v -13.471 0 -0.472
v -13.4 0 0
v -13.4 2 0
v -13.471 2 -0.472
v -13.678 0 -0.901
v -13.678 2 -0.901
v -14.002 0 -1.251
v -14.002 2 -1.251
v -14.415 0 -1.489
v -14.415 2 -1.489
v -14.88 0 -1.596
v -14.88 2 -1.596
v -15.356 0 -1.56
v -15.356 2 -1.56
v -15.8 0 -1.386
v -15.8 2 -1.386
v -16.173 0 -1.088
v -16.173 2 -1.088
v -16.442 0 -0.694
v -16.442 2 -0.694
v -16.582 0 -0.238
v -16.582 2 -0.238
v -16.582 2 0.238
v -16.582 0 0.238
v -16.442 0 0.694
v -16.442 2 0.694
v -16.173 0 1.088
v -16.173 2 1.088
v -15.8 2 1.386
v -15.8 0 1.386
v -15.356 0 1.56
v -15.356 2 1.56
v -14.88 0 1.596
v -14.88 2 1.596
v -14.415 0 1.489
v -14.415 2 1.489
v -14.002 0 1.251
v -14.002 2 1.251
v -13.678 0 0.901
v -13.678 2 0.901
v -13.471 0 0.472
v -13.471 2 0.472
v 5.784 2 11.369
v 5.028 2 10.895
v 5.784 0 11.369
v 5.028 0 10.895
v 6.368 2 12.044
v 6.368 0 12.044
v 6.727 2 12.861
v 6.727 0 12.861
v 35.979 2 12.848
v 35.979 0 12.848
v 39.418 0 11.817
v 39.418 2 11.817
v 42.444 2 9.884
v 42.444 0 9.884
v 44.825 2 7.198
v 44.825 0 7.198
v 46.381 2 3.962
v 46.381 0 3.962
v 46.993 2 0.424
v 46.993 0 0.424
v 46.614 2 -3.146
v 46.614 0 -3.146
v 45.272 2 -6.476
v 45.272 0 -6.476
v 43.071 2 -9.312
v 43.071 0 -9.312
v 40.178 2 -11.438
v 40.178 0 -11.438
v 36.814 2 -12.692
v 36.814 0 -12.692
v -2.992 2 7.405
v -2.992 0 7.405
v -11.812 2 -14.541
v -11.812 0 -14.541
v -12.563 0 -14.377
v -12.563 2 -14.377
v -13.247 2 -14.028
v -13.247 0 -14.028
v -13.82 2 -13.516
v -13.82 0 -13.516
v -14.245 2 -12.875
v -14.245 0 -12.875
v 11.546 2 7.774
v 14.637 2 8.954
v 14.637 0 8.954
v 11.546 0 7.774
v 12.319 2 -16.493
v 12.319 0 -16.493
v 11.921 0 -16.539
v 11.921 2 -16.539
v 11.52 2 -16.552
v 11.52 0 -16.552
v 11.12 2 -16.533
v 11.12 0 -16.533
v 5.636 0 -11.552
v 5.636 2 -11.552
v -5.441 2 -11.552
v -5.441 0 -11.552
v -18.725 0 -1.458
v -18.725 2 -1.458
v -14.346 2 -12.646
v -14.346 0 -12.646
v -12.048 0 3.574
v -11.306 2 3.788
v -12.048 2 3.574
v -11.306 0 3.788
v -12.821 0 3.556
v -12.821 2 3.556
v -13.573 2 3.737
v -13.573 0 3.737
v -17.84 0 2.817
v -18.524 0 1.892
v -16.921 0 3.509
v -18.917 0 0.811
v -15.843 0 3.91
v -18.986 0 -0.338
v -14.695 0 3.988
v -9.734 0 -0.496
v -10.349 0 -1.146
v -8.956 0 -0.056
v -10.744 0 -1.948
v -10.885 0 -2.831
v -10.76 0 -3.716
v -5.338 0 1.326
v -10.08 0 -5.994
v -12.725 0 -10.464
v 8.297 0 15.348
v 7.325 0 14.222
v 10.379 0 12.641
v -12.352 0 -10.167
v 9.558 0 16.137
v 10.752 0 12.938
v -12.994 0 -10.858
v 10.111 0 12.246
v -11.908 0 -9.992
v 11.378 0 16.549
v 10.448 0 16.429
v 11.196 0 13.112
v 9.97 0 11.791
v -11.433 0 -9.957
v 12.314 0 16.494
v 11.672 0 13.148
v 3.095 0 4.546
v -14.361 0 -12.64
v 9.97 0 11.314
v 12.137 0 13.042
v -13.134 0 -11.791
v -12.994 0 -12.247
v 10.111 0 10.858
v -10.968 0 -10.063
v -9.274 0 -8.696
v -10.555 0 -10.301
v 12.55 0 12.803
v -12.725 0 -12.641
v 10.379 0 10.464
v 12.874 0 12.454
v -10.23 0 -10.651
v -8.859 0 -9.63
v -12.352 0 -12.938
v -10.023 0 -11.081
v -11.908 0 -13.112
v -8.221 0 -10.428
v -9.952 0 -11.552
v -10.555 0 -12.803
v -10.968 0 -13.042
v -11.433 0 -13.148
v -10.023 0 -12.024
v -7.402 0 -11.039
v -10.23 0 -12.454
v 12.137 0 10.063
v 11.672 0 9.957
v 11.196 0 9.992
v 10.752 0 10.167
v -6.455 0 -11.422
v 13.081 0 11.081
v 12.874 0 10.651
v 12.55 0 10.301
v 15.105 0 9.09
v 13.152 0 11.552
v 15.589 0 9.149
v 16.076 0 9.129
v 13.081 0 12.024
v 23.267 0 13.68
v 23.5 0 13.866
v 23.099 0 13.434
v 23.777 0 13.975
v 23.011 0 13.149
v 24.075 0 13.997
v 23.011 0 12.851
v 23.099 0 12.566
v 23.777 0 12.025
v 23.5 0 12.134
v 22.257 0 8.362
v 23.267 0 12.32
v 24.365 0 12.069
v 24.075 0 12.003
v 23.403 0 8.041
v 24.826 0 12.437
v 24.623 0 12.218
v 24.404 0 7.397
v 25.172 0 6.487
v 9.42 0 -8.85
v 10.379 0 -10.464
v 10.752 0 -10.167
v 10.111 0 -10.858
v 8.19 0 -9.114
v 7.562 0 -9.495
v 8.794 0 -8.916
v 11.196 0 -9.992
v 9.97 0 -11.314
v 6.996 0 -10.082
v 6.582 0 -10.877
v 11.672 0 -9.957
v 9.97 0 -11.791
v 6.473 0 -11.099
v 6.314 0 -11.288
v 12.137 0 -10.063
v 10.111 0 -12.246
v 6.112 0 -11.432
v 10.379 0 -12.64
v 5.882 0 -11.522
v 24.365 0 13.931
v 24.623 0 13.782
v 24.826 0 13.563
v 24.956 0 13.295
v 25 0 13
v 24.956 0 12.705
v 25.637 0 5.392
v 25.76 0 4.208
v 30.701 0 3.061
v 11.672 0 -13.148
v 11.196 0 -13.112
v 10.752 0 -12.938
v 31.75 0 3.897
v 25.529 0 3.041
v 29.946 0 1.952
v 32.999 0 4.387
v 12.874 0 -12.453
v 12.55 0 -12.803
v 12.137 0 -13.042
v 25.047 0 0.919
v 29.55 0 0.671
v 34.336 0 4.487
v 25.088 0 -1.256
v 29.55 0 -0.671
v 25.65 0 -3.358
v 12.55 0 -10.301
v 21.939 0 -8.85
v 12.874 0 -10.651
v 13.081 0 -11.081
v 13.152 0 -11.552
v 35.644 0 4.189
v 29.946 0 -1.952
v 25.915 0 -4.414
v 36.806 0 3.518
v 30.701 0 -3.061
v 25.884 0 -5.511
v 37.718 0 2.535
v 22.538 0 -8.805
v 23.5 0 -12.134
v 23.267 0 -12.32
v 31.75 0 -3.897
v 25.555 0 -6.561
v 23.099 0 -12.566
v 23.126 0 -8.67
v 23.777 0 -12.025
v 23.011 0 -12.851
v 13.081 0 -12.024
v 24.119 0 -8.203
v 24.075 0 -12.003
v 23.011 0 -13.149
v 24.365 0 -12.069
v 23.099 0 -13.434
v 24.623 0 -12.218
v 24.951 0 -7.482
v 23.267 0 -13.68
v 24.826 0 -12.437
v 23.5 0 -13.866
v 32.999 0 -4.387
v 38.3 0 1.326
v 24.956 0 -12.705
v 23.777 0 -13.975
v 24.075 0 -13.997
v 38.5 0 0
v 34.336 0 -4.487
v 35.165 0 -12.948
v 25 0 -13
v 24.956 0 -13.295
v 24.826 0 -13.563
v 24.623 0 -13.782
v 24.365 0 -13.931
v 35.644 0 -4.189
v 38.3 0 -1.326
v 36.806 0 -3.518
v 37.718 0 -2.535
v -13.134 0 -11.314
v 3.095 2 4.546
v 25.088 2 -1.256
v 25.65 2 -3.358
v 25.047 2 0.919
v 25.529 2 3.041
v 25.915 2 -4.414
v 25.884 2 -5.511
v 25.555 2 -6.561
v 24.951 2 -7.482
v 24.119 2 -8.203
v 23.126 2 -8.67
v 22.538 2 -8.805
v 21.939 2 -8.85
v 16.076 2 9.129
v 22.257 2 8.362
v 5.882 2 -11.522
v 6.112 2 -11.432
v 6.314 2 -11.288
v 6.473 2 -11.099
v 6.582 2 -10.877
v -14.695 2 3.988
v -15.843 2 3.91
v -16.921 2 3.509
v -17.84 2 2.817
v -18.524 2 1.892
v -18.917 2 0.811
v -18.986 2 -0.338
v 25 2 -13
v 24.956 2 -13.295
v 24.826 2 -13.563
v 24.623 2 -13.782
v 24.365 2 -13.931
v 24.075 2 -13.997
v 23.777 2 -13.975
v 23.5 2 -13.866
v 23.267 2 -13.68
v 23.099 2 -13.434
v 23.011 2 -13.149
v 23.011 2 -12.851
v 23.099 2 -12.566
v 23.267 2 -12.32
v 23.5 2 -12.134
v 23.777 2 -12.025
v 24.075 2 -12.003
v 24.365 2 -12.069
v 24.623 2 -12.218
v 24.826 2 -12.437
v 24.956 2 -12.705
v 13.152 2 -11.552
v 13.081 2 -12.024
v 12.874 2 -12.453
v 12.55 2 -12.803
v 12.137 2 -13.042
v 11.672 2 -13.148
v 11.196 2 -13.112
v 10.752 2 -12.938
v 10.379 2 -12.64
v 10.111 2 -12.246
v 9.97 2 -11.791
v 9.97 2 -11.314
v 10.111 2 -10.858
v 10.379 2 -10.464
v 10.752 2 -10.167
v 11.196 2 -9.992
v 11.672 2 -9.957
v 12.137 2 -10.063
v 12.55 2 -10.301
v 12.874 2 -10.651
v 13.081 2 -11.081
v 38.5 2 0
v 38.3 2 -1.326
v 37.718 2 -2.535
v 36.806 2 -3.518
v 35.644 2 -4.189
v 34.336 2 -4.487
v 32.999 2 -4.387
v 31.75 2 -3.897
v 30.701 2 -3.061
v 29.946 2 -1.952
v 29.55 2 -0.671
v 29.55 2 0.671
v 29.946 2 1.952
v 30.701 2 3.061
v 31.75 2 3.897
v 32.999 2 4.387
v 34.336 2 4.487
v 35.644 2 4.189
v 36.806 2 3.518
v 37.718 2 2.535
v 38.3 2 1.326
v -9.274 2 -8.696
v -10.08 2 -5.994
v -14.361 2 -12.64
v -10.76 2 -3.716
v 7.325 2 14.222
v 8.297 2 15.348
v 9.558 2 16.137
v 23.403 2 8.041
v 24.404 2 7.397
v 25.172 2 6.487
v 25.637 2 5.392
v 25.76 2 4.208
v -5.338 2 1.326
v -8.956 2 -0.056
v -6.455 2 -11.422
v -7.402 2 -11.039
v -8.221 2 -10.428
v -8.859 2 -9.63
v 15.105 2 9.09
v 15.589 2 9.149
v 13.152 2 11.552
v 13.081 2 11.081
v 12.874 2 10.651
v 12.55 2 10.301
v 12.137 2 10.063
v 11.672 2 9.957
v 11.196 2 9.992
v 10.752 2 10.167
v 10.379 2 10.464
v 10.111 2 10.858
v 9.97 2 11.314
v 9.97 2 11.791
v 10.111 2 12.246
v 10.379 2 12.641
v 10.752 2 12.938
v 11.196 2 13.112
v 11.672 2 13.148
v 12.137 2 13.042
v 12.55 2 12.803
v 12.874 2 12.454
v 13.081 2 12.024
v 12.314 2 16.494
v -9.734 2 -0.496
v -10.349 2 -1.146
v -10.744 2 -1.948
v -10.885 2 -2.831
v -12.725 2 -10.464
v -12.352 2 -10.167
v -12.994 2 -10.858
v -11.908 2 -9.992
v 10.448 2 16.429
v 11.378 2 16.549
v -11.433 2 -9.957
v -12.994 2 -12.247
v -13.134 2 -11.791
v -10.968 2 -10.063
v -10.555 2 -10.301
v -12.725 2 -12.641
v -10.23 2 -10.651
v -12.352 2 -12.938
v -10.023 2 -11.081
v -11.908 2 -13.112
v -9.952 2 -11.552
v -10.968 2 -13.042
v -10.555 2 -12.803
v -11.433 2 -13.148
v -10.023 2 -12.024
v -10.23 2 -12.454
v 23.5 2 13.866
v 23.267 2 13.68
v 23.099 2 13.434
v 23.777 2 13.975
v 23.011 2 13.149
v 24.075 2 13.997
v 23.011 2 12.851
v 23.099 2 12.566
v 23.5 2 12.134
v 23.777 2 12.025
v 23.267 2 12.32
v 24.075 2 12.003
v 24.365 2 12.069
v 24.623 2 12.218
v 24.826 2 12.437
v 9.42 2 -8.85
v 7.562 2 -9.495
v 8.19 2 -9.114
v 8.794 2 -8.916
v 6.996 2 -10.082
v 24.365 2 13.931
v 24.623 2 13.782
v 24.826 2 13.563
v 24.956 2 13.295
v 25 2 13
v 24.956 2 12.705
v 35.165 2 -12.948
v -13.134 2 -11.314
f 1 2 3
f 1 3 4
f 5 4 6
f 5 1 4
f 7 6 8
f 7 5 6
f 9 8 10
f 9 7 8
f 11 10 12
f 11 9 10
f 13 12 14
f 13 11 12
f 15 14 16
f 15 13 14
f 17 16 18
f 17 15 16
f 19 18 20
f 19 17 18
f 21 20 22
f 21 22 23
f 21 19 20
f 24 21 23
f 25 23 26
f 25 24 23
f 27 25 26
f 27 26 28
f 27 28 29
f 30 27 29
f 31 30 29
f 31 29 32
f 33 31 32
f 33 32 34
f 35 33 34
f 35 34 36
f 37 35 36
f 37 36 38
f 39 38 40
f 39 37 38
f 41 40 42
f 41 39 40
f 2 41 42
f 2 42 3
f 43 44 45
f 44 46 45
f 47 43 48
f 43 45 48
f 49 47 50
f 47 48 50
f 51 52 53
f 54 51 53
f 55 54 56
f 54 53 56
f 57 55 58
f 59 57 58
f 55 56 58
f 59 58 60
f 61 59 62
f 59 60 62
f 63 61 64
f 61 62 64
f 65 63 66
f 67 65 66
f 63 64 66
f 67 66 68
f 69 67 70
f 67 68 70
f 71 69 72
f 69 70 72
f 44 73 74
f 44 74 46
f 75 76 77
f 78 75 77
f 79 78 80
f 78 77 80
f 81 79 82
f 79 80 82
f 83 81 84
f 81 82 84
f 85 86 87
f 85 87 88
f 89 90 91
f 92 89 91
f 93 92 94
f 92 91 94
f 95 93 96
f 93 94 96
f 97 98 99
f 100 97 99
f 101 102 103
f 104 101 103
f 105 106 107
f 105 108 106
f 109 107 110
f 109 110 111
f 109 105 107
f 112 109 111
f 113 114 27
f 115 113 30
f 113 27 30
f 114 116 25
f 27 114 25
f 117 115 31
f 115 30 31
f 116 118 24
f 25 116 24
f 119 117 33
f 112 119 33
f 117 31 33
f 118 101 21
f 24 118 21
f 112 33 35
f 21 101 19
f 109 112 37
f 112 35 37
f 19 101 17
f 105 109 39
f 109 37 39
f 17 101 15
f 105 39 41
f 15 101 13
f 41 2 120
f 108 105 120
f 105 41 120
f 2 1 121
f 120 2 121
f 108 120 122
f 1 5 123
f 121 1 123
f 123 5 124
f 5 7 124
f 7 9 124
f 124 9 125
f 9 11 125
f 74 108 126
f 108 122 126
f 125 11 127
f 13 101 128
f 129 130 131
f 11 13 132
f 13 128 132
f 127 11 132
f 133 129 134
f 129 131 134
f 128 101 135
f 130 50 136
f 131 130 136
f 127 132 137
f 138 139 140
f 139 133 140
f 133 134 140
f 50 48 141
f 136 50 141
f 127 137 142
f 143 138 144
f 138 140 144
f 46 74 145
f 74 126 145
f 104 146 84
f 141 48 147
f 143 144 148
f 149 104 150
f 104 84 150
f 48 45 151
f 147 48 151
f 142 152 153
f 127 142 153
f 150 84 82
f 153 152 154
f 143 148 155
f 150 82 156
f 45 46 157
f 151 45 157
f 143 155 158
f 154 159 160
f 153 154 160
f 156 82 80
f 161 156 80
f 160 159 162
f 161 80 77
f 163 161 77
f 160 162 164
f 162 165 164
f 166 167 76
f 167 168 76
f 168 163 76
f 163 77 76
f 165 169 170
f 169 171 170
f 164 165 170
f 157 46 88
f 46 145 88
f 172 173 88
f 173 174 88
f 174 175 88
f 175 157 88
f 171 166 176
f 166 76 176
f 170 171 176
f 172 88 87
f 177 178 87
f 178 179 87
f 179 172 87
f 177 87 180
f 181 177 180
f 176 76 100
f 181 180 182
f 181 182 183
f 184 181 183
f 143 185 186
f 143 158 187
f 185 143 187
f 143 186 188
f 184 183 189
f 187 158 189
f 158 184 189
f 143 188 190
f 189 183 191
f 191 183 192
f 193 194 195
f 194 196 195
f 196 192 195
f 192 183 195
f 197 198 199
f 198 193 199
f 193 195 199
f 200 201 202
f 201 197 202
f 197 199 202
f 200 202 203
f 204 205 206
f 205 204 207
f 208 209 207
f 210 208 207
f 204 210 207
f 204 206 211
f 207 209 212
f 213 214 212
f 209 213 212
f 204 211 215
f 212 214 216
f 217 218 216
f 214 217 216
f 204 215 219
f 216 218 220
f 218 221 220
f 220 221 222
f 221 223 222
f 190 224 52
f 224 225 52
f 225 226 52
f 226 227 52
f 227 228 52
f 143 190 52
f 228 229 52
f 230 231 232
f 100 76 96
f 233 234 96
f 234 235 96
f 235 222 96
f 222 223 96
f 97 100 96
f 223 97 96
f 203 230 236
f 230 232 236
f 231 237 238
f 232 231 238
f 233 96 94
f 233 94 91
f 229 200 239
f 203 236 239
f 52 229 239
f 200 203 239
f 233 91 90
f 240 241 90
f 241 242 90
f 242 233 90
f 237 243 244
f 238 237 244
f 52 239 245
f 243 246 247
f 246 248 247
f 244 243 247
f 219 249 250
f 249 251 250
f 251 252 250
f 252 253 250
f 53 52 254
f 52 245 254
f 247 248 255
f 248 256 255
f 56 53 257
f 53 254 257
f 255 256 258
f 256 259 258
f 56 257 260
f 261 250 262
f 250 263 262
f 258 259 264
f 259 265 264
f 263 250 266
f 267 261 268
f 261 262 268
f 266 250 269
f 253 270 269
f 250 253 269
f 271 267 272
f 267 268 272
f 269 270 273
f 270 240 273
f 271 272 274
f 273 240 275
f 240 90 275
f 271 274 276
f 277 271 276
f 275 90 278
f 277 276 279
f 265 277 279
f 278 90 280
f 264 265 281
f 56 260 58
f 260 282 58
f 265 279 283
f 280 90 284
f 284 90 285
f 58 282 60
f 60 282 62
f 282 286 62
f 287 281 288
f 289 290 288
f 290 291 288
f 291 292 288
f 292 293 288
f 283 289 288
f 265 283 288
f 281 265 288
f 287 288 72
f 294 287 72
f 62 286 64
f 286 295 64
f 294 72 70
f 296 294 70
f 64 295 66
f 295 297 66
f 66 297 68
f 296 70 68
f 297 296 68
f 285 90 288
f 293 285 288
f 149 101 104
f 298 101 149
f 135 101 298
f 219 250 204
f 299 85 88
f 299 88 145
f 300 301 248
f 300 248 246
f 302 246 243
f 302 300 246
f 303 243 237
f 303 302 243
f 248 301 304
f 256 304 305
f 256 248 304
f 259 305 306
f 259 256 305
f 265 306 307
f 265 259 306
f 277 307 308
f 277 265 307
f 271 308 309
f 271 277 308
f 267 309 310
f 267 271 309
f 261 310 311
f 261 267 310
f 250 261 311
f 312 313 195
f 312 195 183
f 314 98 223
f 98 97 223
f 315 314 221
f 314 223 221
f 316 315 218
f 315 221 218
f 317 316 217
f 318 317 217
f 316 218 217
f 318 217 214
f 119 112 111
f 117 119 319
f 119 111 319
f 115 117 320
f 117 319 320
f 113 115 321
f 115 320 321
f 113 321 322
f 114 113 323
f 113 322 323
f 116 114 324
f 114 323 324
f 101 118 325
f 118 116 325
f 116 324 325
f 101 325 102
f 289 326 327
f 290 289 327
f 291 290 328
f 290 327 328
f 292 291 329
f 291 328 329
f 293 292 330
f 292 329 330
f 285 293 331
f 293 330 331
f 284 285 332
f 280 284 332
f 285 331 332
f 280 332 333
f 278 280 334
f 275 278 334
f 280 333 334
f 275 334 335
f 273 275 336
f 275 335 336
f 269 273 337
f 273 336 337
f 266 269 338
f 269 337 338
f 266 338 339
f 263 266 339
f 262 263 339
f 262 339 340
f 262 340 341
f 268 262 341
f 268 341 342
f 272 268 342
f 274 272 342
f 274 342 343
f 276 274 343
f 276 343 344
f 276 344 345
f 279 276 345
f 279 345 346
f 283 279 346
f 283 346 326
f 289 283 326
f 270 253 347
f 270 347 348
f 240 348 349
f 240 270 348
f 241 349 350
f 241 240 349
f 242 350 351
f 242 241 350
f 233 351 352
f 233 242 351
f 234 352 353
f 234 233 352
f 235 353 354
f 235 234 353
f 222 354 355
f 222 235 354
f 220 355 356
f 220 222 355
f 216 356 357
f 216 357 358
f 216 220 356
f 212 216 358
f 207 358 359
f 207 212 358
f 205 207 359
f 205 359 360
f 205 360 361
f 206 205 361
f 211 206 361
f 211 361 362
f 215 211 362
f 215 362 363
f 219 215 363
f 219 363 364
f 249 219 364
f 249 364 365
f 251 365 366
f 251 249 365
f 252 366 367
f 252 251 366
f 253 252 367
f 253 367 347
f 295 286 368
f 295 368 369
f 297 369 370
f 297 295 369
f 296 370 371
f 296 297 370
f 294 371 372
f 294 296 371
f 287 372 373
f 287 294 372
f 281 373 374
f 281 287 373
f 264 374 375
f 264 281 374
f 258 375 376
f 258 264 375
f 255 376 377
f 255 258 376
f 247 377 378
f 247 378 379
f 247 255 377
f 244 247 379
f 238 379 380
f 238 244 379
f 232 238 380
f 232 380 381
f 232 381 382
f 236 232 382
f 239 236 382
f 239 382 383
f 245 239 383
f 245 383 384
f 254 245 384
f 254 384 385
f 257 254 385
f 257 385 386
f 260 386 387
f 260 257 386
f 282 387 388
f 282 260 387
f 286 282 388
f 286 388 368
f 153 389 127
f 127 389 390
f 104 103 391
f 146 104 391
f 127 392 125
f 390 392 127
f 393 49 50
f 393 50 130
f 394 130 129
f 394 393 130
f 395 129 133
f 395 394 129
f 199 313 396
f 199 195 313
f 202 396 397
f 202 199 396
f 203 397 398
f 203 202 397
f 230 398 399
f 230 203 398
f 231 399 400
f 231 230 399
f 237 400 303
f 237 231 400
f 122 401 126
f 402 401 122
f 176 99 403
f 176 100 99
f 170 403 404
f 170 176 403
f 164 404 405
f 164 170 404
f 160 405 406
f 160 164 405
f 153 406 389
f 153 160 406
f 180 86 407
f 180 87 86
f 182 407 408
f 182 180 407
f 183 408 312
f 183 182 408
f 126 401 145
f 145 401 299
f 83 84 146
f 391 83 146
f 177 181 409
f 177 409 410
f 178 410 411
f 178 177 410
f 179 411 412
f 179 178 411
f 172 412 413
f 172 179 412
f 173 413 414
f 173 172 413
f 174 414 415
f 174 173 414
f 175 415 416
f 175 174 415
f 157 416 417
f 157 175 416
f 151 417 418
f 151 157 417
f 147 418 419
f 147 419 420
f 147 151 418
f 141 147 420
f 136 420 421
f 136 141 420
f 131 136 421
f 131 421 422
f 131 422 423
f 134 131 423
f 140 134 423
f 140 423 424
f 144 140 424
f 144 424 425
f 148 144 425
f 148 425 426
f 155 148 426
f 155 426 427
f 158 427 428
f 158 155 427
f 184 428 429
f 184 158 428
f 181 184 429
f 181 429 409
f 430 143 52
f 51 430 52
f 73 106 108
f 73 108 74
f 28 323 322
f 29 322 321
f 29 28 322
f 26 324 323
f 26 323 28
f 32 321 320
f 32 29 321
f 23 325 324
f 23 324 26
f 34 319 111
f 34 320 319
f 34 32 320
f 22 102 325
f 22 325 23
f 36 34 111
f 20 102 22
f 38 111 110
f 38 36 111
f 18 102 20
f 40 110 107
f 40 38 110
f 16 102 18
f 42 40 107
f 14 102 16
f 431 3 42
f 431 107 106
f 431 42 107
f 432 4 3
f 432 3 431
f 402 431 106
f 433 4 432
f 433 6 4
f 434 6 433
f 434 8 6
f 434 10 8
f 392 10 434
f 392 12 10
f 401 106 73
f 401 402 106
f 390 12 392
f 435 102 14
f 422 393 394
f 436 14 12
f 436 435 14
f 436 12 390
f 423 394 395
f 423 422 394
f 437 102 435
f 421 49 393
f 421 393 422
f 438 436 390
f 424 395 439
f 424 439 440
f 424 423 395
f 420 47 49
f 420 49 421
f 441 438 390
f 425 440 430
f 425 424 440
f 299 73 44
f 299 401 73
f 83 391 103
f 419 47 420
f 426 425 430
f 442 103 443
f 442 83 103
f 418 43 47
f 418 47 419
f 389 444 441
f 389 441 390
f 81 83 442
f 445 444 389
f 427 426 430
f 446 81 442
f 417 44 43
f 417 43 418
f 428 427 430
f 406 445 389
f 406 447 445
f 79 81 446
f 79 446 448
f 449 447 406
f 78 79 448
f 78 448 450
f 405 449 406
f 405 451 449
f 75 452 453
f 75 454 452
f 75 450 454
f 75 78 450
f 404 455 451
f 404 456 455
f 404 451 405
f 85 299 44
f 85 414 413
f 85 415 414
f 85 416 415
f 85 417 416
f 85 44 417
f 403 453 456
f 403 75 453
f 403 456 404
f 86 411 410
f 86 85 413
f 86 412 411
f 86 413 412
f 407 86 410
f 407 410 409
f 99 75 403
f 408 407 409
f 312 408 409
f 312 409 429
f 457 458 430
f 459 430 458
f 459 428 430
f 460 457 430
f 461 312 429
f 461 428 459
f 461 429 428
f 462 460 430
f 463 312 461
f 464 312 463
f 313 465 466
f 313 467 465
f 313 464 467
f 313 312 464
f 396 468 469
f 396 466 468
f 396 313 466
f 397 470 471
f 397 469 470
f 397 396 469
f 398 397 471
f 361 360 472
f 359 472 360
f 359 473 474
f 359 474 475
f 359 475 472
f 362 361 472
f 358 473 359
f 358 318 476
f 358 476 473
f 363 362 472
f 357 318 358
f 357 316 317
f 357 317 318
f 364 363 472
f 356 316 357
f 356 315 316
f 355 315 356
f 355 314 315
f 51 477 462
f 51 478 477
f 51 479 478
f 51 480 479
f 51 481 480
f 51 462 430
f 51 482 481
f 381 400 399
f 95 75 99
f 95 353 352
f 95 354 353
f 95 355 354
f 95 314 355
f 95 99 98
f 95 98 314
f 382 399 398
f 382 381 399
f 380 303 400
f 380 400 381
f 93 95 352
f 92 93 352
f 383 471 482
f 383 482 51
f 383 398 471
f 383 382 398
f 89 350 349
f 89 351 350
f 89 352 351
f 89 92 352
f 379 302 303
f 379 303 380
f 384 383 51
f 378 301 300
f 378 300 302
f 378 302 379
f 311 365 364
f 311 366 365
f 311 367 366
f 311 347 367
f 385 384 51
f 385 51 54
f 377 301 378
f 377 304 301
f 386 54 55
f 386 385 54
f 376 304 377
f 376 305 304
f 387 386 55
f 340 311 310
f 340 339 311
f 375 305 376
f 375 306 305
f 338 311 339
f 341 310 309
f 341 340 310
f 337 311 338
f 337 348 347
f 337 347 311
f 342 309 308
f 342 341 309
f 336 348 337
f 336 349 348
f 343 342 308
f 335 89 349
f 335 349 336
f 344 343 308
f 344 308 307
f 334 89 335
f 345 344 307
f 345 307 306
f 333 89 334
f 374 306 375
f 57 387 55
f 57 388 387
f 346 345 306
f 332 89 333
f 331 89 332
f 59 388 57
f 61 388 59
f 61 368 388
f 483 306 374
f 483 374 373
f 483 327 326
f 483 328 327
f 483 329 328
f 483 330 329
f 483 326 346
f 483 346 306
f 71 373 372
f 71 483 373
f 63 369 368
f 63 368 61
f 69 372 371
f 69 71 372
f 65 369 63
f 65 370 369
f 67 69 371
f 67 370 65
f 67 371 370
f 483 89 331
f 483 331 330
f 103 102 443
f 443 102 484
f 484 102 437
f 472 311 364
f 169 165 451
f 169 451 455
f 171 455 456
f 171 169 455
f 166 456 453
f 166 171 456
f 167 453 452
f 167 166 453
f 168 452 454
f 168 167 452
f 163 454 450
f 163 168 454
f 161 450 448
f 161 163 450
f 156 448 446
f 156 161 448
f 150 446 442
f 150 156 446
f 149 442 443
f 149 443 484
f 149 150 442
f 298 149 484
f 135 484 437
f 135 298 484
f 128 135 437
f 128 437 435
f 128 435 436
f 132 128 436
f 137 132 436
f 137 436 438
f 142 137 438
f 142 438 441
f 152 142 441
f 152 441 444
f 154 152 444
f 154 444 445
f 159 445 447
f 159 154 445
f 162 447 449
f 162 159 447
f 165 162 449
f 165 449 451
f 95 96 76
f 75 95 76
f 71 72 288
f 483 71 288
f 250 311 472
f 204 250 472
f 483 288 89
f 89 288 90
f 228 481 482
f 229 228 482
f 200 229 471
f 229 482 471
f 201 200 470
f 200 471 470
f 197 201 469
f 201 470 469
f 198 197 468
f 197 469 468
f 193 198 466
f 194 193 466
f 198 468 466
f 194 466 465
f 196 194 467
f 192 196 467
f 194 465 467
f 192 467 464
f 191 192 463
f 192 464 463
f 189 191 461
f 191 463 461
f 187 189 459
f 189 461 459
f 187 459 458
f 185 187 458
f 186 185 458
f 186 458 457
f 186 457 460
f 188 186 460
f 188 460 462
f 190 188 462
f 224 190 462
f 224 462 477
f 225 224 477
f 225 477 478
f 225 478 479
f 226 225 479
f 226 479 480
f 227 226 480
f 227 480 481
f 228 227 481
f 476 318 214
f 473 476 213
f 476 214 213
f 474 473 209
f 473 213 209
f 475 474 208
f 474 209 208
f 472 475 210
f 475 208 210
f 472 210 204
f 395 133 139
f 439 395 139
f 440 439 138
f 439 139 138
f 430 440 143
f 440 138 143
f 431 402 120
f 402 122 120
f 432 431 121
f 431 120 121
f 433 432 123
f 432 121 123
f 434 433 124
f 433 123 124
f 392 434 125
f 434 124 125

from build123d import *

# Parameters (mm, degrees)
SKETCH1_R           = 1.6
SKETCH1_R_2         = 1
SKETCH1_R_3         = 5.5
SKETCH1_R_4         = 4.5
BOSS_EXTRUDE2_DEPTH = 2
SKETCH2_R           = 1
BOSS_EXTRUDE3_DEPTH = 2
SKETCH3_R           = 1
CUT_EXTRUDE1_DEPTH  = 103
CUT_EXTRUDE2_DEPTH  = 10
BOSS_EXTRUDE4_DEPTH = 2
FILLET1_R           = 3
CUT_EXTRUDE3_DEPTH  = 10
CUT_EXTRUDE4_DEPTH  = 10
BOSS_EXTRUDE5_DEPTH = 2
CUT_EXTRUDE5_DEPTH  = 10
CUT_EXTRUDE9_DEPTH  = 10
FILLET3_R           = 4
CUT_EXTRUDE10_DEPTH = 10
FILLET4_R           = 4
FILLET6_R           = 1
FILLET7_R           = 3
SKETCH13_R          = 1.6
SKETCH13_R_2        = 1
SKETCH13_R_3        = 4.5
BOSS_EXTRUDE7_DEPTH = 2
FILLET8_R           = 3


with BuildPart() as part:
    # Sketch1 → Boss-Extrude2 (new body)
    with BuildSketch(Plane(origin=(0, 0, 0), x_dir=(1, 0, 0), z_dir=(0, 1, 0))):
        with BuildLine():
            Line((12.313589515, -16.493996637), (35.979225245, -12.848450001))
            ThreePointArc((35.979225245, -12.848450001), (46.993067566, -0.424494085), (36.813648041, 12.691862933))
            Line((36.813648041, 12.691862933), (35.165189196, 12.947676785))
            Line((35.165189196, 12.947676785), (12.319067304, 16.493021261))
            ThreePointArc((12.319067304, 16.493021261), (11.720527595, 16.549330191), (11.119556233, 16.533395936))
            Line((11.119556233, 16.533395936), (-11.812019178, 14.541098507))
            ThreePointArc((-11.812019178, 14.541098507), (-13.247239988, 14.027709898), (-14.244912332, 12.87528787))
            Line((-14.244912332, 12.87528787), (-19.487592157, 2.204884721))
            ThreePointArc((-19.487592157, 2.204884721), (-19.693653105, -1.723258696), (-16.994761113, -4.584858569))
            Line((-16.994761113, -4.584858569), (9.557587922, -16.137143667))
            ThreePointArc((9.557587922, -16.137143667), (10.910298182, -16.51089082), (12.313589515, -16.493996637))
        make_face()
        with Locations((11.552349036, -11.552285098)):
            Circle(SKETCH1_R, mode=Mode.SUBTRACT)
        with Locations((25, -11)):
            Circle(SKETCH1_R_2, mode=Mode.SUBTRACT)
        with Locations((-15, 0)):
            Circle(SKETCH1_R, mode=Mode.SUBTRACT)
        Circle(SKETCH1_R_3, mode=Mode.SUBTRACT)
        with Locations((-11.552357038, 11.552357038)):
            Circle(SKETCH1_R, mode=Mode.SUBTRACT)
        with Locations((11.552326466, 11.552160153)):
            Circle(SKETCH1_R, mode=Mode.SUBTRACT)
        with Locations((14, 0)):
            Circle(SKETCH1_R_4, mode=Mode.SUBTRACT)
        with Locations((34, 0)):
            Circle(SKETCH1_R_4, mode=Mode.SUBTRACT)
        with Locations((25, 11)):
            Circle(SKETCH1_R_2, mode=Mode.SUBTRACT)
    extrude(amount=BOSS_EXTRUDE2_DEPTH)

    # Sketch2 → Boss-Extrude3 (add)
    with BuildSketch(Plane(origin=(0, 2, 0), x_dir=(1, 0, 0), z_dir=(0, 1, 0))):
        with Locations((25, 11)):
            Circle(SKETCH2_R)
        with Locations((25, -11)):
            Circle(SKETCH2_R)
    extrude(amount=-BOSS_EXTRUDE3_DEPTH)

    # Sketch3 → Cut-Extrude1 (cut)
    with BuildSketch(Plane(origin=(0, 2, 0), x_dir=(1, 0, 0), z_dir=(0, 1, 0))):
        with Locations((24, 13)):
            Circle(SKETCH3_R)
        with Locations((24, -13)):
            Circle(SKETCH3_R)
    extrude(amount=-CUT_EXTRUDE1_DEPTH, mode=Mode.SUBTRACT)

    # Sketch4 → Cut-Extrude2 (cut)
    with BuildSketch(Plane(origin=(0, 2, 0), x_dir=(1, 0, 0), z_dir=(0, 1, 0))):
        with BuildLine():
            Line((-11.556207856, 1.04895048), (-9.269369924, 8.711683705))
            Line((-9.269369924, 8.711683705), (11.51784634, 8.478494442))
            Line((11.51784634, 8.478494442), (14.72101257, 8.44256159))
            ThreePointArc((14.72101257, 8.44256159), (23.806986873, -0.105659112), (15.258766171, -9.191633415))
            Line((15.258766171, -9.191633415), (11.546390573, -7.773884745))
            Line((11.546390573, -7.773884745), (-11.556207856, 1.04895048))
        make_face()
    extrude(amount=-CUT_EXTRUDE2_DEPTH, mode=Mode.SUBTRACT)

    # Sketch5 → Boss-Extrude4 (add)
    with BuildSketch(Plane(origin=(0, 2, 0), x_dir=(1, 0, 0), z_dir=(0, 1, 0))):
        Polygon((-5.337802217, -1.325845952), (3.09520559, -4.546394435), (3.755970184, -8.105851045), (-7.77052306, -5.643881614), align=None)
    extrude(amount=-BOSS_EXTRUDE4_DEPTH)

    # Fillet1
    fillet1_edges = [part.edges().sort_by_distance(p)[0] for p in [
        (14.72101257, 1, -8.44256159),
        (-11.556207856, 1, -1.04895048),
        (-9.269369924, 1, -8.711683705),
        (15.258766171, 1, 9.191633415),
    ]]
    fillet(fillet1_edges, radius=FILLET1_R)

    # Sketch6 → Cut-Extrude3 (cut)
    with BuildSketch(Plane(origin=(0, 2, 0), x_dir=(1, 0, 0), z_dir=(0, 1, 0))):
        with BuildLine():
            Line((-10.415141431, -1.994761113), (6.967490467, -9.557523985))
            ThreePointArc((6.967490467, -9.557523985), (7.370614613, -14.293288056), (11.552349036, -16.552285098))
            Line((11.552349036, -16.552285098), (4.640159697, -19.625925194))
            Line((4.640159697, -19.625925194), (-19.442024068, -14.318556871))
            Line((-19.442024068, -14.318556871), (-16.994761113, -4.584858569))
            ThreePointArc((-16.994761113, -4.584858569), (-13.168524525, -4.652493695), (-10.415141431, -1.994761113))
        make_face()
    extrude(amount=-CUT_EXTRUDE3_DEPTH, mode=Mode.SUBTRACT)

    # Sketch7 → Cut-Extrude4 (cut)
    with BuildSketch(Plane(origin=(0, 2, 0), x_dir=(1, 0, 0), z_dir=(0, 1, 0))):
        with BuildLine():
            Line((-19.487592157, 2.204884721), (-14.360758579, 12.639506513))
            Line((-14.360758579, 12.639506513), (-40.027877899, 1.746555748))
            Line((-40.027877899, 1.746555748), (-13.686394089, -14.892557088))
            Line((-13.686394089, -14.892557088), (-5.537805094, -4.116772232))
            Line((-5.537805094, -4.116772232), (-10.415141431, -1.994761113))
            ThreePointArc((-10.415141431, -1.994761113), (-17.100386029, -4.537441849), (-19.487592157, 2.204884721))
        make_face()
        with BuildLine():
            Line((-18.724859342, 1.457883014), (-14.346001544, 12.645769298))
            Line((-14.346001544, 12.645769298), (-14.360758579, 12.639506513))
            Line((-14.360758579, 12.639506513), (-19.487592157, 2.204884721))
            ThreePointArc((-19.487592157, 2.204884721), (-17.100386029, -4.537441849), (-10.415141431, -1.994761113))
            Line((-10.415141431, -1.994761113), (-11.332113145, -1.595808891))
            ThreePointArc((-11.332113145, -1.595808891), (-16.527111662, -3.697016361), (-18.724859342, 1.457883014))
        make_face()
    extrude(amount=-CUT_EXTRUDE4_DEPTH, mode=Mode.SUBTRACT)

    # Sketch8 → Boss-Extrude5 (add)
    with BuildSketch(Plane(origin=(0, 2, 0), x_dir=(1, 0, 0), z_dir=(0, 1, 0))):
        Polygon((-2.581263562, -6.493638152), (8.323551355, -11.238059471), (9.15275877, -8.13729454), (-12.005428352, 0), (-12.793973249, -2.050335084), align=None)
    extrude(amount=-BOSS_EXTRUDE5_DEPTH)

    # Sketch9 → Cut-Extrude5 (cut)
    with BuildSketch(Plane(origin=(0, 2, 0), x_dir=(1, 0, 0), z_dir=(0, 1, 0))):
        with BuildLine():
            Line((3.827614939, 8.564762818), (30.440563146, 8.266220979))
            ThreePointArc((30.440563146, 8.266220979), (25.034594613, 0.788356673), (29.052589856, -7.518186807))
            Line((29.052589856, -7.518186807), (16.076287148, -9.128577435))
            Line((16.076287148, -9.128577435), (3.827614939, 8.564762818))
        make_face()
    extrude(amount=-CUT_EXTRUDE5_DEPTH, mode=Mode.SUBTRACT)

    # Sketch10 → Cut-Extrude9 (cut)
    with BuildSketch(Plane(origin=(0, 2, 0), x_dir=(1, 0, 0), z_dir=(0, 1, 0))):
        with BuildLine():
            ThreePointArc((-7.00779509, 8.686313546), (-8.820444577, 8.102111249), (-9.916159809, 6.544421096))
            Line((-9.916159809, 6.544421096), (25.022400978, -0.634598928))
            ThreePointArc((25.022400978, -0.634598928), (26.312317261, 4.679693805), (30.440563146, 8.266220979))
            Line((30.440563146, 8.266220979), (22.948527848, 8.350266008))
            Line((22.948527848, 8.350266008), (15.45649255, 8.434311037))
            ThreePointArc((15.45649255, 8.434311037), (15.11388418, 8.44578882), (14.771088556, 8.443946344))
            ThreePointArc((14.771088556, 8.443946344), (14.717060069, 8.443092594), (14.663024969, 8.44321209))
            Line((14.663024969, 8.44321209), (-7.00779509, 8.686313546))
        make_face()
        with BuildLine():
            Line((-9.442365056, 8.850266008), (-9.916159809, 6.544421096))
            ThreePointArc((-9.916159809, 6.544421096), (-8.820444577, 8.102111249), (-7.00779509, 8.686313546))
            Line((-7.00779509, 8.686313546), (14.663024969, 8.44321209))
            ThreePointArc((14.663024969, 8.44321209), (14.717060069, 8.443092594), (14.771088556, 8.443946344))
            ThreePointArc((14.771088556, 8.443946344), (15.11388418, 8.44578882), (15.45649255, 8.434311037))
            Line((15.45649255, 8.434311037), (22.948527848, 8.350266008))
            Line((22.948527848, 8.350266008), (22.948527848, 8.850266008))
            Line((22.948527848, 8.850266008), (-9.442365056, 8.850266008))
        make_face()
        with BuildLine():
            Line((22.948527848, 8.350266008), (30.440563146, 8.266220979))
            ThreePointArc((30.440563146, 8.266220979), (31.386481977, 8.612172986), (32.365132548, 8.850266008))
            Line((32.365132548, 8.850266008), (22.948527848, 8.850266008))
            Line((22.948527848, 8.850266008), (22.948527848, 8.350266008))
        make_face()
    extrude(amount=-CUT_EXTRUDE9_DEPTH, mode=Mode.SUBTRACT)

    # Fillet3
    fillet3_edges = [part.edges().sort_by_distance(p)[0] for p in [
        (-9.442365056, 1, -8.850266008),
        (32.365132548, 1, -8.850266008),
        (29.052589856, 1, 7.518186807),
    ]]
    fillet(fillet3_edges, radius=FILLET3_R)

    # Sketch11 → Cut-Extrude10 (cut)
    with BuildSketch(Plane(origin=(0, 2, 0), x_dir=(1, 0, 0), z_dir=(0, 1, 0))):
        with BuildLine():
            Line((-8.421668575, 11.552160153), (-10.08037838, 5.994157747))
            ThreePointArc((-10.08037838, 5.994157747), (-8.637451976, 8.057723487), (-6.247427599, 8.850266008))
            Line((-6.247427599, 8.850266008), (7.345217242, 8.850266008))
            ThreePointArc((7.345217242, 8.850266008), (6.754642331, 10.14424434), (6.552326466, 11.552160153))
            Line((6.552326466, 11.552160153), (-8.421668575, 11.552160153))
        make_face()
    extrude(amount=-CUT_EXTRUDE10_DEPTH, mode=Mode.SUBTRACT)

    # Fillet4
    fillet4_edges = [part.edges().sort_by_distance(p)[0] for p in [
        (-8.421668575, 1, -11.552160153),
    ]]
    fillet(fillet4_edges, radius=FILLET4_R)

    # Fillet6
    fillet6_edges = [part.edges().sort_by_distance(p)[0] for p in [
        (6.552326466, 1, -11.552160153),
    ]]
    fillet(fillet6_edges, radius=FILLET6_R)

    # Fillet7
    fillet7_edges = [part.edges().sort_by_distance(p)[0] for p in [
        (7.345217242, 1, -8.850266008),
    ]]
    fillet(fillet7_edges, radius=FILLET7_R)

    # Sketch13 → Boss-Extrude7 (add)
    with BuildSketch(Plane(origin=(0, 2, 0), x_dir=(1, 0, 0), z_dir=(0, 1, 0))):
        with BuildLine():
            Line((-2.992134647, -7.405424257), (-2.593182424, -6.488452543))
            Line((-2.593182424, -6.488452543), (-11.847536046, -2.462107028))
            ThreePointArc((-11.847536046, -2.462107028), (-12.208910636, -2.865278374), (-12.62142125, -3.215954467))
            Line((-12.62142125, -3.215954467), (-2.992134647, -7.405424257))
        make_face()
        with BuildLine():
            Line((6.661171198, -10.514798057), (-2.593182424, -6.488452543))
            Line((-2.593182424, -6.488452543), (-2.992134647, -7.405424257))
            Line((-2.992134647, -7.405424257), (6.552352302, -11.557999767))
            ThreePointArc((6.552352302, -11.557999767), (6.579331737, -11.033537621), (6.661171198, -10.514798057))
        make_face()
        with BuildLine():
            Line((7.960909986, -12.17082916), (6.552352302, -11.557999767))
            ThreePointArc((6.552352302, -11.557999767), (8.299230544, -15.349286557), (12.313589515, -16.493996637))
            Line((12.313589515, -16.493996637), (35.979225245, -12.848450001))
            ThreePointArc((35.979225245, -12.848450001), (46.993067566, -0.424494085), (36.813648041, 12.691862933))
            Line((36.813648041, 12.691862933), (12.319067304, 16.493021261))
            ThreePointArc((12.319067304, 16.493021261), (11.720527595, 16.549330191), (11.119556233, 16.533395936))
            Line((11.119556233, 16.533395936), (-11.812019178, 14.541098507))
            ThreePointArc((-11.812019178, 14.541098507), (-13.247239988, 14.027709898), (-14.244912332, 12.87528787))
            Line((-14.244912332, 12.87528787), (-14.360758579, 12.639506513))
            Line((-14.360758579, 12.639506513), (-14.346001544, 12.645769298))
            Line((-14.346001544, 12.645769298), (-18.724859342, 1.457883014))
            ThreePointArc((-18.724859342, 1.457883014), (-17.431934838, -3.175798001), (-12.62142125, -3.215954467))
            Line((-12.62142125, -3.215954467), (-13.921939677, -2.650130342))
            Line((-13.921939677, -2.650130342), (-12.211113783, -0.329635092))
            Line((-12.211113783, -0.329635092), (7.960909986, -9.788126708))
            Line((7.960909986, -9.788126708), (7.960909986, -12.17082916))
        make_face()
        with Locations((11.552349036, -11.552285098)):
            Circle(SKETCH13_R, mode=Mode.SUBTRACT)
        with Locations((24, -13)):
            Circle(SKETCH13_R_2, mode=Mode.SUBTRACT)
        with Locations((-15, 0)):
            Circle(SKETCH13_R, mode=Mode.SUBTRACT)
        with BuildLine():
            Line((-5.441084244, 11.552160153), (5.636246683, 11.552160153))
            ThreePointArc((5.636246683, 11.552160153), (6.217397927, 11.365955725), (6.5821233, 10.876686617))
            ThreePointArc((6.5821233, 10.876686617), (7.676299419, 9.408879294), (9.419753151, 8.850266008))
            Line((9.419753151, 8.850266008), (21.938701577, 8.850266008))
            ThreePointArc((21.938701577, 8.850266008), (25.253030933, 7.0897349), (25.649870322, 3.357876467))
            ThreePointArc((25.649870322, 3.357876467), (25.001600498, 0.169724478), (25.529184516, -3.04060603))
            ThreePointArc((25.529184516, -3.04060603), (25.171651417, -6.487334994), (22.257008224, -8.361534964))
            Line((22.257008224, -8.361534964), (16.076287148, -9.128577435))
            ThreePointArc((16.076287148, -9.128577435), (15.345692081, -9.129601903), (14.636514373, -8.953996722))
            Line((14.636514373, -8.953996722), (-8.955748715, 0.055840437))
            ThreePointArc((-8.955748715, 0.055840437), (-10.5762844, 1.53199573), (-10.760161968, 3.716339886))
            Line((-10.760161968, 3.716339886), (-9.274035024, 8.696051893))
            ThreePointArc((-9.274035024, 8.696051893), (-7.83110862, 10.759617632), (-5.441084244, 11.552160153))
        make_face(mode=Mode.SUBTRACT)
        with Locations((-11.552357038, 11.552357038)):
            Circle(SKETCH13_R, mode=Mode.SUBTRACT)
        with Locations((11.552326466, 11.552160153)):
            Circle(SKETCH13_R, mode=Mode.SUBTRACT)
        with Locations((34, 0)):
            Circle(SKETCH13_R_3, mode=Mode.SUBTRACT)
        with Locations((24, 13)):
            Circle(SKETCH13_R_2, mode=Mode.SUBTRACT)
    extrude(amount=-BOSS_EXTRUDE7_DEPTH)

    # Fillet8
    fillet8_edges = [part.edges().sort_by_distance(p)[0] for p in [
        (-12.62142125, 1, 3.215954467),
        (6.552352302, 1, 11.557999767),
    ]]
    fillet(fillet8_edges, radius=FILLET8_R)


solid = part.part
